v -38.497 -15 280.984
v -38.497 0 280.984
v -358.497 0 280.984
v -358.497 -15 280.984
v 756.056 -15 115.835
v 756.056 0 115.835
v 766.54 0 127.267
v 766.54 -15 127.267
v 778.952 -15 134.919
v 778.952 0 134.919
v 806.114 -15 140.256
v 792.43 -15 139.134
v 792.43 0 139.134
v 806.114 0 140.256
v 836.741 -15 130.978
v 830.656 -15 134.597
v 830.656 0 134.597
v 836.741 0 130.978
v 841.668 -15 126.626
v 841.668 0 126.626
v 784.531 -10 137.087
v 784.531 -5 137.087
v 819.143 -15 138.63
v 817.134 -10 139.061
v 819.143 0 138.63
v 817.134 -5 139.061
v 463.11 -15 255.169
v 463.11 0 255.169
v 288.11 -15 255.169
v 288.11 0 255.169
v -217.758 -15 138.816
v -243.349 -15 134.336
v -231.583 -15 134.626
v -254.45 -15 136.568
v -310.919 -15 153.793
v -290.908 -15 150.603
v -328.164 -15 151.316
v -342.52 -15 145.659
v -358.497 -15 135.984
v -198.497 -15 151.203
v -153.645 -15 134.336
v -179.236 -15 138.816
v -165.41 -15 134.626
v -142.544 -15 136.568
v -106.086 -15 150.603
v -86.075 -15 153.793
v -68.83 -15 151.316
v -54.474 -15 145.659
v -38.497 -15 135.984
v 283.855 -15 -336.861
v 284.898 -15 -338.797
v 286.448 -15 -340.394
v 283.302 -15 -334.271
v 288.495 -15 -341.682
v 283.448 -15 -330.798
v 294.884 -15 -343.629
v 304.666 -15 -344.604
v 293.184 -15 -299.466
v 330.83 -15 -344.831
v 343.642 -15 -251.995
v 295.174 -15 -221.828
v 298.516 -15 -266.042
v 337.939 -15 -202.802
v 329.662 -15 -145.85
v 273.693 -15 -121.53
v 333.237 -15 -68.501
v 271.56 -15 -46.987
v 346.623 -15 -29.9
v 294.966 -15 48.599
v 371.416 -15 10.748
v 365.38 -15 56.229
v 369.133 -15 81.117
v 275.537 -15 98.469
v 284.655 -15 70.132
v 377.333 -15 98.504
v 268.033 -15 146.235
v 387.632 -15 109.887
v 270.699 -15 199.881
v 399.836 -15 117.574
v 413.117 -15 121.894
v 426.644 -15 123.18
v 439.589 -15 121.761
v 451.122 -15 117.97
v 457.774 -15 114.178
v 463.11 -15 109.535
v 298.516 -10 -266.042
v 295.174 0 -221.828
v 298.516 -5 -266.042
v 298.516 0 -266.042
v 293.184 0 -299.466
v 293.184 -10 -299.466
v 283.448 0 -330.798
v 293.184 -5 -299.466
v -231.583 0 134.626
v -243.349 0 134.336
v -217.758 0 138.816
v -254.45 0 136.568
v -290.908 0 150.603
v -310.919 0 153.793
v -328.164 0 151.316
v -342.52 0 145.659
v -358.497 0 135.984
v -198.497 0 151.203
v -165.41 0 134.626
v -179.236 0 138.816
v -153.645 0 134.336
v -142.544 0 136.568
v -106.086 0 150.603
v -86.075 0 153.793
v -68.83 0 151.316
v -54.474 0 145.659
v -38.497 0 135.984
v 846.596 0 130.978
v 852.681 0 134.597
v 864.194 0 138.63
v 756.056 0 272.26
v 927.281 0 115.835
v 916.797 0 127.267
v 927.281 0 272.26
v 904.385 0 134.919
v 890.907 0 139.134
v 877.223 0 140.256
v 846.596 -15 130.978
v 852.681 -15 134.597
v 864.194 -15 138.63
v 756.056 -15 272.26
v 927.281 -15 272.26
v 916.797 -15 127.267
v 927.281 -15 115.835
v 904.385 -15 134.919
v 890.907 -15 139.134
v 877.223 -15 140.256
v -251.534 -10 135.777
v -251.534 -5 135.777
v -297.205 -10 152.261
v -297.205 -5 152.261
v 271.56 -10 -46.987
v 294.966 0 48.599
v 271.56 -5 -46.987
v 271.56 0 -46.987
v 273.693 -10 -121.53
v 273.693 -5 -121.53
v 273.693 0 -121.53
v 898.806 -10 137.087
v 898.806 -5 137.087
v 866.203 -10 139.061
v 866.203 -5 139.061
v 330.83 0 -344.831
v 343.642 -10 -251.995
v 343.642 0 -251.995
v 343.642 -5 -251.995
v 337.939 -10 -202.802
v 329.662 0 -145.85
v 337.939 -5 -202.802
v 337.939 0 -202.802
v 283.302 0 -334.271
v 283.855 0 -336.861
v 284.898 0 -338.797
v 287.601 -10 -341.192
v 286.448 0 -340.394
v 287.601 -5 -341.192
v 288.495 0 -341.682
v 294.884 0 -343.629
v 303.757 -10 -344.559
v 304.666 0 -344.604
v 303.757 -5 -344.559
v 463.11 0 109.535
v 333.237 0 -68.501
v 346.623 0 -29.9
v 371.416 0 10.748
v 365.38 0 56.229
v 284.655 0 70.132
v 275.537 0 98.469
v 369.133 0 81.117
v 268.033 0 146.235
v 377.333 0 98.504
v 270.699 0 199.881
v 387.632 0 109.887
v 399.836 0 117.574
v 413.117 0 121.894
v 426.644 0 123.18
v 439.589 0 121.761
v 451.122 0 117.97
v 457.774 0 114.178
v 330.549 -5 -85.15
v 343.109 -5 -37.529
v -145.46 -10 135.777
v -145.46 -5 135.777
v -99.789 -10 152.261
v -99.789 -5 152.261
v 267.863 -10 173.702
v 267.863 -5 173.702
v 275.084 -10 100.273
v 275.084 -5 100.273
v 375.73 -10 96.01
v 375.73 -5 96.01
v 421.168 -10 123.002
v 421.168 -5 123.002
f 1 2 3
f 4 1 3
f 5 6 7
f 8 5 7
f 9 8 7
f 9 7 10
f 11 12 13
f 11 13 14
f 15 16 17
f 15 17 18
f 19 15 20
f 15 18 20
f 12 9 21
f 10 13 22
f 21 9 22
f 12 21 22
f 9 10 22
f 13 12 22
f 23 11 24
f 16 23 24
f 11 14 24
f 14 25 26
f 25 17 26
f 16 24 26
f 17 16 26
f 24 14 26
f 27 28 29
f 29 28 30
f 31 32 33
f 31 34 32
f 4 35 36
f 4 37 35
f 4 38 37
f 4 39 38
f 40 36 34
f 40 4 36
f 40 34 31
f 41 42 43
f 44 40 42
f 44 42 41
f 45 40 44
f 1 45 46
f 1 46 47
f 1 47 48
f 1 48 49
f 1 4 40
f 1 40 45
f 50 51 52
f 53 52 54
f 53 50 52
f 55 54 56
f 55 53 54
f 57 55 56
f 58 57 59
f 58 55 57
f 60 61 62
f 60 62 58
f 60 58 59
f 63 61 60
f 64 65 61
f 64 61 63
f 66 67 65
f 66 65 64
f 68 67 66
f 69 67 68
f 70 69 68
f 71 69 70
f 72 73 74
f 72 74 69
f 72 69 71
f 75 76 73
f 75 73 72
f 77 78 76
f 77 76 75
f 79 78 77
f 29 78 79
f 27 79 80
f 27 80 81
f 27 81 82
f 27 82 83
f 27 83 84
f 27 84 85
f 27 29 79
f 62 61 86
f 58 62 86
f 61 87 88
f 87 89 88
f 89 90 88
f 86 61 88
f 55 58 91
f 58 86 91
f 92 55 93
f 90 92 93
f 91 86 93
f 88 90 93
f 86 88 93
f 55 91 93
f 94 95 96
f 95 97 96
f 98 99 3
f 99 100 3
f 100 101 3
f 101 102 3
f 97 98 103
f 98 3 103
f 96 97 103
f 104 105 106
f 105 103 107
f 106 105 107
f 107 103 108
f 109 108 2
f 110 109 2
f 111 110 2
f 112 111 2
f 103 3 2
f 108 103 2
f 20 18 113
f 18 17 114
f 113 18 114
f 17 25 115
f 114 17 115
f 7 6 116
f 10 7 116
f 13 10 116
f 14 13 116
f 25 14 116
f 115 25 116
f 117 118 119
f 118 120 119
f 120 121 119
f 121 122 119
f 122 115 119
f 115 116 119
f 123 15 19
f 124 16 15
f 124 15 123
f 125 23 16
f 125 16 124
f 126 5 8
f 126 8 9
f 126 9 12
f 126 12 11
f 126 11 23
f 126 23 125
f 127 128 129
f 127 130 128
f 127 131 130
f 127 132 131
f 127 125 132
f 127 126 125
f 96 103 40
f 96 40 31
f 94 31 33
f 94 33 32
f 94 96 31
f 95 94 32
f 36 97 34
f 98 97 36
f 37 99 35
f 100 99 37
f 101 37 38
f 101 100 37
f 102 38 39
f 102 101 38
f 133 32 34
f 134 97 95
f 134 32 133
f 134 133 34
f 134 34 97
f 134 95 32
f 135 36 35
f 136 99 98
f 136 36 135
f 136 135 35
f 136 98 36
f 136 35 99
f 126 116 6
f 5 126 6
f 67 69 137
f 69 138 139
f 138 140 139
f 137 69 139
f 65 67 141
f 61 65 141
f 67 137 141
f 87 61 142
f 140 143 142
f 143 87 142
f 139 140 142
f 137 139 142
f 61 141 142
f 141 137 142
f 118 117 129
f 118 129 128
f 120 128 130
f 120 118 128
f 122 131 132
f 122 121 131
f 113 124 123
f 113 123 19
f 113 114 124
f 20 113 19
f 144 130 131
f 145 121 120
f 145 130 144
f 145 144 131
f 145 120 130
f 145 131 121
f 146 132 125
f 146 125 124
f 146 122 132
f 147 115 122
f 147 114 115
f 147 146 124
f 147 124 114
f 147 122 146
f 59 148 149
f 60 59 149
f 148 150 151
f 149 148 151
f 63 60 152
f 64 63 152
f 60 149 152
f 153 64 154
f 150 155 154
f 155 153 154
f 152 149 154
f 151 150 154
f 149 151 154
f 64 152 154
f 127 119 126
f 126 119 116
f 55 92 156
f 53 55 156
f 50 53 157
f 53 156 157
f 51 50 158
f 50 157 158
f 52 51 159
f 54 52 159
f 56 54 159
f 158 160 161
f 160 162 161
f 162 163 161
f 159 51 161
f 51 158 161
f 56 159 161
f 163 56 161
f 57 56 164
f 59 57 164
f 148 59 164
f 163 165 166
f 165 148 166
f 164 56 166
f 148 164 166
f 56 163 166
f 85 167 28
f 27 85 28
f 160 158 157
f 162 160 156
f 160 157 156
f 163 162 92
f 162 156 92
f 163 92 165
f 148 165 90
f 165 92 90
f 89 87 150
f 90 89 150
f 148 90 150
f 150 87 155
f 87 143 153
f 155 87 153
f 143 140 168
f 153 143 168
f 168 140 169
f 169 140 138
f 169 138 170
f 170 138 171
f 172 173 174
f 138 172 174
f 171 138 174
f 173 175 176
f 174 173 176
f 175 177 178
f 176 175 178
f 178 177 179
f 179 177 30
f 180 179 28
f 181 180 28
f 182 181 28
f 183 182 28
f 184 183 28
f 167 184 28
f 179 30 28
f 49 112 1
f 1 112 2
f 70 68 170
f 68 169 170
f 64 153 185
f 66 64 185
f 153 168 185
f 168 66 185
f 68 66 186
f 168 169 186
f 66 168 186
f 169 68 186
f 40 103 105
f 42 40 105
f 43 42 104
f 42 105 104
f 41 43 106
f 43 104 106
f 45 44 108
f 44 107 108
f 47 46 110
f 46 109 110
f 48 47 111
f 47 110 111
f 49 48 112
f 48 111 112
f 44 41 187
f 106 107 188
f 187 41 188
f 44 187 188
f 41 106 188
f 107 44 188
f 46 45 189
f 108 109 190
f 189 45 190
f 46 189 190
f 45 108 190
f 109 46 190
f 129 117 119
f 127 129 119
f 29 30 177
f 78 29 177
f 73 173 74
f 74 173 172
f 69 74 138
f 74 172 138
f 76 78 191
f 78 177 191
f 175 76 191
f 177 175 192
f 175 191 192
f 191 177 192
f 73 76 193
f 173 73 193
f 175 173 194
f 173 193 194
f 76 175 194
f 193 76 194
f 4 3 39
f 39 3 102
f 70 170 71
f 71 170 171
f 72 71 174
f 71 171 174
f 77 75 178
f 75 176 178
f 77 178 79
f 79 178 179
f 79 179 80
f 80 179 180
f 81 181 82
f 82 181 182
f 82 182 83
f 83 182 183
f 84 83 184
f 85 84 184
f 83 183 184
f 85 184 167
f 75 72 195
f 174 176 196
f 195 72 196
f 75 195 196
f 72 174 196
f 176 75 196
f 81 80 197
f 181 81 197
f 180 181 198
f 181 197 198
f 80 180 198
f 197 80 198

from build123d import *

# Parameters (mm, degrees)
F1_DEPTH = 15
F2_DEPTH = 15
F3_DEPTH = 15


with BuildPart() as f1:
    # F0 (on Front) → F1 (new body)
    with BuildSketch(Plane.XZ):
        with BuildLine():
            Line((463.110126, 255.169205), (288.110126, 255.169205))
            add(Edge.make_bspline(
                [(288.110126, 255.169205), (249.193357, 174.255844), (273.688601, 84.823082), (294.966065, 48.598974)],
                knots=[0, 0, 0, 0, 206.683972, 206.683972, 206.683972, 206.683972], degree=3))
            add(Edge.make_bspline(
                [(294.966065, 48.598974), (256.727729, -73.108729), (266.082252, -93.051994), (295.174377, -221.827967)],
                knots=[0, 0, 0, 0, 270.427022, 270.427022, 270.427022, 270.427022], degree=3))
            add(Edge.make_bspline(
                [(295.174377, -221.827967), (304.276329, -274.335988), (293.963748, -297.612955), (283.447891, -330.798209)],
                knots=[0, 0, 0, 0, 109.59938, 109.59938, 109.59938, 109.59938], degree=3))
            add(Edge.make_bspline(
                [(283.447891, -330.798209), (281.237967, -346.016963), (298.661124, -344.795057), (330.830317, -344.830795)],
                knots=[0, 0, 0, 0, 49.416674, 49.416674, 49.416674, 49.416674], degree=3))
            add(Edge.make_bspline(
                [(330.830317, -344.830795), (358.212999, -213.038297), (333.912301, -223.8161), (329.661631, -145.850426)],
                knots=[0, 0, 0, 0, 198.983801, 198.983801, 198.983801, 198.983801], degree=3))
            add(Edge.make_bspline(
                [(329.661631, -145.850426), (326.071466, -74.030816), (333.876299, -42.43674), (371.416426, 10.747927)],
                knots=[0, 0, 0, 0, 162.069451, 162.069451, 162.069451, 162.069451], degree=3))
            add(Edge.make_bspline(
                [(371.416426, 10.747927), (340.293404, 131.081836), (437.789615, 137.295173), (463.110126, 109.535025)],
                knots=[0, 0, 0, 0, 134.783624, 134.783624, 134.783624, 134.783624], degree=3))
            Line((463.110126, 109.535025), (463.110126, 255.169205))
        make_face()
    extrude(amount=F1_DEPTH)


with BuildPart() as f2:
    # F0 (on Front) → F2 (new body)
    with BuildSketch(Plane.XZ):
        with BuildLine():
            Line((927.280897, 272.260344), (756.055832, 272.260344))
            Line((756.055832, 272.260344), (756.055832, 115.83538))
            add(Edge.make_bspline(
                [(756.055832, 115.83538), (778.400105, 148.349309), (825.235044, 144.642838), (841.668364, 126.626164)],
                knots=[47.30741, 47.30741, 47.30741, 47.30741, 134.783624, 134.783624, 134.783624, 134.783624], degree=3))
            add(Edge.make_bspline(
                [(927.280897, 115.83538), (904.936623, 148.349309), (858.101684, 144.642838), (841.668364, 126.626164)],
                knots=[47.30741, 47.30741, 47.30741, 47.30741, 134.783624, 134.783624, 134.783624, 134.783624], degree=3))
            Line((927.280897, 115.83538), (927.280897, 272.260344))
        make_face()
    extrude(amount=F2_DEPTH)


with BuildPart() as f3:
    # F0 (on Front) → F3 (new body)
    with BuildSketch(Plane.XZ):
        with BuildLine():
            Line((-198.496819, 151.20326), (-198.496819, 280.984465))
            Line((-198.496819, 280.984465), (-358.496819, 280.984465))
            Line((-358.496819, 280.984465), (-358.496819, 135.984465))
            add(Edge.make_bspline(
                [(-198.496819, 151.20326), (-262.879595, 98.266304), (-281.73241, 190.196536), (-358.496819, 135.984465)],
                knots=[0, 0, 0, 0, 160.722157, 160.722157, 160.722157, 160.722157], degree=3))
        make_face()
        with BuildLine():
            Line((-38.496819, 135.984465), (-38.496819, 280.984465))
            Line((-38.496819, 280.984465), (-198.496819, 280.984465))
            Line((-198.496819, 280.984465), (-198.496819, 151.20326))
            add(Edge.make_bspline(
                [(-198.496819, 151.20326), (-134.114042, 98.266304), (-115.261227, 190.196536), (-38.496819, 135.984465)],
                knots=[0, 0, 0, 0, 160.722157, 160.722157, 160.722157, 160.722157], degree=3))
        make_face()
    extrude(amount=F3_DEPTH)


solid = Compound([f1.part, f2.part, f3.part])
